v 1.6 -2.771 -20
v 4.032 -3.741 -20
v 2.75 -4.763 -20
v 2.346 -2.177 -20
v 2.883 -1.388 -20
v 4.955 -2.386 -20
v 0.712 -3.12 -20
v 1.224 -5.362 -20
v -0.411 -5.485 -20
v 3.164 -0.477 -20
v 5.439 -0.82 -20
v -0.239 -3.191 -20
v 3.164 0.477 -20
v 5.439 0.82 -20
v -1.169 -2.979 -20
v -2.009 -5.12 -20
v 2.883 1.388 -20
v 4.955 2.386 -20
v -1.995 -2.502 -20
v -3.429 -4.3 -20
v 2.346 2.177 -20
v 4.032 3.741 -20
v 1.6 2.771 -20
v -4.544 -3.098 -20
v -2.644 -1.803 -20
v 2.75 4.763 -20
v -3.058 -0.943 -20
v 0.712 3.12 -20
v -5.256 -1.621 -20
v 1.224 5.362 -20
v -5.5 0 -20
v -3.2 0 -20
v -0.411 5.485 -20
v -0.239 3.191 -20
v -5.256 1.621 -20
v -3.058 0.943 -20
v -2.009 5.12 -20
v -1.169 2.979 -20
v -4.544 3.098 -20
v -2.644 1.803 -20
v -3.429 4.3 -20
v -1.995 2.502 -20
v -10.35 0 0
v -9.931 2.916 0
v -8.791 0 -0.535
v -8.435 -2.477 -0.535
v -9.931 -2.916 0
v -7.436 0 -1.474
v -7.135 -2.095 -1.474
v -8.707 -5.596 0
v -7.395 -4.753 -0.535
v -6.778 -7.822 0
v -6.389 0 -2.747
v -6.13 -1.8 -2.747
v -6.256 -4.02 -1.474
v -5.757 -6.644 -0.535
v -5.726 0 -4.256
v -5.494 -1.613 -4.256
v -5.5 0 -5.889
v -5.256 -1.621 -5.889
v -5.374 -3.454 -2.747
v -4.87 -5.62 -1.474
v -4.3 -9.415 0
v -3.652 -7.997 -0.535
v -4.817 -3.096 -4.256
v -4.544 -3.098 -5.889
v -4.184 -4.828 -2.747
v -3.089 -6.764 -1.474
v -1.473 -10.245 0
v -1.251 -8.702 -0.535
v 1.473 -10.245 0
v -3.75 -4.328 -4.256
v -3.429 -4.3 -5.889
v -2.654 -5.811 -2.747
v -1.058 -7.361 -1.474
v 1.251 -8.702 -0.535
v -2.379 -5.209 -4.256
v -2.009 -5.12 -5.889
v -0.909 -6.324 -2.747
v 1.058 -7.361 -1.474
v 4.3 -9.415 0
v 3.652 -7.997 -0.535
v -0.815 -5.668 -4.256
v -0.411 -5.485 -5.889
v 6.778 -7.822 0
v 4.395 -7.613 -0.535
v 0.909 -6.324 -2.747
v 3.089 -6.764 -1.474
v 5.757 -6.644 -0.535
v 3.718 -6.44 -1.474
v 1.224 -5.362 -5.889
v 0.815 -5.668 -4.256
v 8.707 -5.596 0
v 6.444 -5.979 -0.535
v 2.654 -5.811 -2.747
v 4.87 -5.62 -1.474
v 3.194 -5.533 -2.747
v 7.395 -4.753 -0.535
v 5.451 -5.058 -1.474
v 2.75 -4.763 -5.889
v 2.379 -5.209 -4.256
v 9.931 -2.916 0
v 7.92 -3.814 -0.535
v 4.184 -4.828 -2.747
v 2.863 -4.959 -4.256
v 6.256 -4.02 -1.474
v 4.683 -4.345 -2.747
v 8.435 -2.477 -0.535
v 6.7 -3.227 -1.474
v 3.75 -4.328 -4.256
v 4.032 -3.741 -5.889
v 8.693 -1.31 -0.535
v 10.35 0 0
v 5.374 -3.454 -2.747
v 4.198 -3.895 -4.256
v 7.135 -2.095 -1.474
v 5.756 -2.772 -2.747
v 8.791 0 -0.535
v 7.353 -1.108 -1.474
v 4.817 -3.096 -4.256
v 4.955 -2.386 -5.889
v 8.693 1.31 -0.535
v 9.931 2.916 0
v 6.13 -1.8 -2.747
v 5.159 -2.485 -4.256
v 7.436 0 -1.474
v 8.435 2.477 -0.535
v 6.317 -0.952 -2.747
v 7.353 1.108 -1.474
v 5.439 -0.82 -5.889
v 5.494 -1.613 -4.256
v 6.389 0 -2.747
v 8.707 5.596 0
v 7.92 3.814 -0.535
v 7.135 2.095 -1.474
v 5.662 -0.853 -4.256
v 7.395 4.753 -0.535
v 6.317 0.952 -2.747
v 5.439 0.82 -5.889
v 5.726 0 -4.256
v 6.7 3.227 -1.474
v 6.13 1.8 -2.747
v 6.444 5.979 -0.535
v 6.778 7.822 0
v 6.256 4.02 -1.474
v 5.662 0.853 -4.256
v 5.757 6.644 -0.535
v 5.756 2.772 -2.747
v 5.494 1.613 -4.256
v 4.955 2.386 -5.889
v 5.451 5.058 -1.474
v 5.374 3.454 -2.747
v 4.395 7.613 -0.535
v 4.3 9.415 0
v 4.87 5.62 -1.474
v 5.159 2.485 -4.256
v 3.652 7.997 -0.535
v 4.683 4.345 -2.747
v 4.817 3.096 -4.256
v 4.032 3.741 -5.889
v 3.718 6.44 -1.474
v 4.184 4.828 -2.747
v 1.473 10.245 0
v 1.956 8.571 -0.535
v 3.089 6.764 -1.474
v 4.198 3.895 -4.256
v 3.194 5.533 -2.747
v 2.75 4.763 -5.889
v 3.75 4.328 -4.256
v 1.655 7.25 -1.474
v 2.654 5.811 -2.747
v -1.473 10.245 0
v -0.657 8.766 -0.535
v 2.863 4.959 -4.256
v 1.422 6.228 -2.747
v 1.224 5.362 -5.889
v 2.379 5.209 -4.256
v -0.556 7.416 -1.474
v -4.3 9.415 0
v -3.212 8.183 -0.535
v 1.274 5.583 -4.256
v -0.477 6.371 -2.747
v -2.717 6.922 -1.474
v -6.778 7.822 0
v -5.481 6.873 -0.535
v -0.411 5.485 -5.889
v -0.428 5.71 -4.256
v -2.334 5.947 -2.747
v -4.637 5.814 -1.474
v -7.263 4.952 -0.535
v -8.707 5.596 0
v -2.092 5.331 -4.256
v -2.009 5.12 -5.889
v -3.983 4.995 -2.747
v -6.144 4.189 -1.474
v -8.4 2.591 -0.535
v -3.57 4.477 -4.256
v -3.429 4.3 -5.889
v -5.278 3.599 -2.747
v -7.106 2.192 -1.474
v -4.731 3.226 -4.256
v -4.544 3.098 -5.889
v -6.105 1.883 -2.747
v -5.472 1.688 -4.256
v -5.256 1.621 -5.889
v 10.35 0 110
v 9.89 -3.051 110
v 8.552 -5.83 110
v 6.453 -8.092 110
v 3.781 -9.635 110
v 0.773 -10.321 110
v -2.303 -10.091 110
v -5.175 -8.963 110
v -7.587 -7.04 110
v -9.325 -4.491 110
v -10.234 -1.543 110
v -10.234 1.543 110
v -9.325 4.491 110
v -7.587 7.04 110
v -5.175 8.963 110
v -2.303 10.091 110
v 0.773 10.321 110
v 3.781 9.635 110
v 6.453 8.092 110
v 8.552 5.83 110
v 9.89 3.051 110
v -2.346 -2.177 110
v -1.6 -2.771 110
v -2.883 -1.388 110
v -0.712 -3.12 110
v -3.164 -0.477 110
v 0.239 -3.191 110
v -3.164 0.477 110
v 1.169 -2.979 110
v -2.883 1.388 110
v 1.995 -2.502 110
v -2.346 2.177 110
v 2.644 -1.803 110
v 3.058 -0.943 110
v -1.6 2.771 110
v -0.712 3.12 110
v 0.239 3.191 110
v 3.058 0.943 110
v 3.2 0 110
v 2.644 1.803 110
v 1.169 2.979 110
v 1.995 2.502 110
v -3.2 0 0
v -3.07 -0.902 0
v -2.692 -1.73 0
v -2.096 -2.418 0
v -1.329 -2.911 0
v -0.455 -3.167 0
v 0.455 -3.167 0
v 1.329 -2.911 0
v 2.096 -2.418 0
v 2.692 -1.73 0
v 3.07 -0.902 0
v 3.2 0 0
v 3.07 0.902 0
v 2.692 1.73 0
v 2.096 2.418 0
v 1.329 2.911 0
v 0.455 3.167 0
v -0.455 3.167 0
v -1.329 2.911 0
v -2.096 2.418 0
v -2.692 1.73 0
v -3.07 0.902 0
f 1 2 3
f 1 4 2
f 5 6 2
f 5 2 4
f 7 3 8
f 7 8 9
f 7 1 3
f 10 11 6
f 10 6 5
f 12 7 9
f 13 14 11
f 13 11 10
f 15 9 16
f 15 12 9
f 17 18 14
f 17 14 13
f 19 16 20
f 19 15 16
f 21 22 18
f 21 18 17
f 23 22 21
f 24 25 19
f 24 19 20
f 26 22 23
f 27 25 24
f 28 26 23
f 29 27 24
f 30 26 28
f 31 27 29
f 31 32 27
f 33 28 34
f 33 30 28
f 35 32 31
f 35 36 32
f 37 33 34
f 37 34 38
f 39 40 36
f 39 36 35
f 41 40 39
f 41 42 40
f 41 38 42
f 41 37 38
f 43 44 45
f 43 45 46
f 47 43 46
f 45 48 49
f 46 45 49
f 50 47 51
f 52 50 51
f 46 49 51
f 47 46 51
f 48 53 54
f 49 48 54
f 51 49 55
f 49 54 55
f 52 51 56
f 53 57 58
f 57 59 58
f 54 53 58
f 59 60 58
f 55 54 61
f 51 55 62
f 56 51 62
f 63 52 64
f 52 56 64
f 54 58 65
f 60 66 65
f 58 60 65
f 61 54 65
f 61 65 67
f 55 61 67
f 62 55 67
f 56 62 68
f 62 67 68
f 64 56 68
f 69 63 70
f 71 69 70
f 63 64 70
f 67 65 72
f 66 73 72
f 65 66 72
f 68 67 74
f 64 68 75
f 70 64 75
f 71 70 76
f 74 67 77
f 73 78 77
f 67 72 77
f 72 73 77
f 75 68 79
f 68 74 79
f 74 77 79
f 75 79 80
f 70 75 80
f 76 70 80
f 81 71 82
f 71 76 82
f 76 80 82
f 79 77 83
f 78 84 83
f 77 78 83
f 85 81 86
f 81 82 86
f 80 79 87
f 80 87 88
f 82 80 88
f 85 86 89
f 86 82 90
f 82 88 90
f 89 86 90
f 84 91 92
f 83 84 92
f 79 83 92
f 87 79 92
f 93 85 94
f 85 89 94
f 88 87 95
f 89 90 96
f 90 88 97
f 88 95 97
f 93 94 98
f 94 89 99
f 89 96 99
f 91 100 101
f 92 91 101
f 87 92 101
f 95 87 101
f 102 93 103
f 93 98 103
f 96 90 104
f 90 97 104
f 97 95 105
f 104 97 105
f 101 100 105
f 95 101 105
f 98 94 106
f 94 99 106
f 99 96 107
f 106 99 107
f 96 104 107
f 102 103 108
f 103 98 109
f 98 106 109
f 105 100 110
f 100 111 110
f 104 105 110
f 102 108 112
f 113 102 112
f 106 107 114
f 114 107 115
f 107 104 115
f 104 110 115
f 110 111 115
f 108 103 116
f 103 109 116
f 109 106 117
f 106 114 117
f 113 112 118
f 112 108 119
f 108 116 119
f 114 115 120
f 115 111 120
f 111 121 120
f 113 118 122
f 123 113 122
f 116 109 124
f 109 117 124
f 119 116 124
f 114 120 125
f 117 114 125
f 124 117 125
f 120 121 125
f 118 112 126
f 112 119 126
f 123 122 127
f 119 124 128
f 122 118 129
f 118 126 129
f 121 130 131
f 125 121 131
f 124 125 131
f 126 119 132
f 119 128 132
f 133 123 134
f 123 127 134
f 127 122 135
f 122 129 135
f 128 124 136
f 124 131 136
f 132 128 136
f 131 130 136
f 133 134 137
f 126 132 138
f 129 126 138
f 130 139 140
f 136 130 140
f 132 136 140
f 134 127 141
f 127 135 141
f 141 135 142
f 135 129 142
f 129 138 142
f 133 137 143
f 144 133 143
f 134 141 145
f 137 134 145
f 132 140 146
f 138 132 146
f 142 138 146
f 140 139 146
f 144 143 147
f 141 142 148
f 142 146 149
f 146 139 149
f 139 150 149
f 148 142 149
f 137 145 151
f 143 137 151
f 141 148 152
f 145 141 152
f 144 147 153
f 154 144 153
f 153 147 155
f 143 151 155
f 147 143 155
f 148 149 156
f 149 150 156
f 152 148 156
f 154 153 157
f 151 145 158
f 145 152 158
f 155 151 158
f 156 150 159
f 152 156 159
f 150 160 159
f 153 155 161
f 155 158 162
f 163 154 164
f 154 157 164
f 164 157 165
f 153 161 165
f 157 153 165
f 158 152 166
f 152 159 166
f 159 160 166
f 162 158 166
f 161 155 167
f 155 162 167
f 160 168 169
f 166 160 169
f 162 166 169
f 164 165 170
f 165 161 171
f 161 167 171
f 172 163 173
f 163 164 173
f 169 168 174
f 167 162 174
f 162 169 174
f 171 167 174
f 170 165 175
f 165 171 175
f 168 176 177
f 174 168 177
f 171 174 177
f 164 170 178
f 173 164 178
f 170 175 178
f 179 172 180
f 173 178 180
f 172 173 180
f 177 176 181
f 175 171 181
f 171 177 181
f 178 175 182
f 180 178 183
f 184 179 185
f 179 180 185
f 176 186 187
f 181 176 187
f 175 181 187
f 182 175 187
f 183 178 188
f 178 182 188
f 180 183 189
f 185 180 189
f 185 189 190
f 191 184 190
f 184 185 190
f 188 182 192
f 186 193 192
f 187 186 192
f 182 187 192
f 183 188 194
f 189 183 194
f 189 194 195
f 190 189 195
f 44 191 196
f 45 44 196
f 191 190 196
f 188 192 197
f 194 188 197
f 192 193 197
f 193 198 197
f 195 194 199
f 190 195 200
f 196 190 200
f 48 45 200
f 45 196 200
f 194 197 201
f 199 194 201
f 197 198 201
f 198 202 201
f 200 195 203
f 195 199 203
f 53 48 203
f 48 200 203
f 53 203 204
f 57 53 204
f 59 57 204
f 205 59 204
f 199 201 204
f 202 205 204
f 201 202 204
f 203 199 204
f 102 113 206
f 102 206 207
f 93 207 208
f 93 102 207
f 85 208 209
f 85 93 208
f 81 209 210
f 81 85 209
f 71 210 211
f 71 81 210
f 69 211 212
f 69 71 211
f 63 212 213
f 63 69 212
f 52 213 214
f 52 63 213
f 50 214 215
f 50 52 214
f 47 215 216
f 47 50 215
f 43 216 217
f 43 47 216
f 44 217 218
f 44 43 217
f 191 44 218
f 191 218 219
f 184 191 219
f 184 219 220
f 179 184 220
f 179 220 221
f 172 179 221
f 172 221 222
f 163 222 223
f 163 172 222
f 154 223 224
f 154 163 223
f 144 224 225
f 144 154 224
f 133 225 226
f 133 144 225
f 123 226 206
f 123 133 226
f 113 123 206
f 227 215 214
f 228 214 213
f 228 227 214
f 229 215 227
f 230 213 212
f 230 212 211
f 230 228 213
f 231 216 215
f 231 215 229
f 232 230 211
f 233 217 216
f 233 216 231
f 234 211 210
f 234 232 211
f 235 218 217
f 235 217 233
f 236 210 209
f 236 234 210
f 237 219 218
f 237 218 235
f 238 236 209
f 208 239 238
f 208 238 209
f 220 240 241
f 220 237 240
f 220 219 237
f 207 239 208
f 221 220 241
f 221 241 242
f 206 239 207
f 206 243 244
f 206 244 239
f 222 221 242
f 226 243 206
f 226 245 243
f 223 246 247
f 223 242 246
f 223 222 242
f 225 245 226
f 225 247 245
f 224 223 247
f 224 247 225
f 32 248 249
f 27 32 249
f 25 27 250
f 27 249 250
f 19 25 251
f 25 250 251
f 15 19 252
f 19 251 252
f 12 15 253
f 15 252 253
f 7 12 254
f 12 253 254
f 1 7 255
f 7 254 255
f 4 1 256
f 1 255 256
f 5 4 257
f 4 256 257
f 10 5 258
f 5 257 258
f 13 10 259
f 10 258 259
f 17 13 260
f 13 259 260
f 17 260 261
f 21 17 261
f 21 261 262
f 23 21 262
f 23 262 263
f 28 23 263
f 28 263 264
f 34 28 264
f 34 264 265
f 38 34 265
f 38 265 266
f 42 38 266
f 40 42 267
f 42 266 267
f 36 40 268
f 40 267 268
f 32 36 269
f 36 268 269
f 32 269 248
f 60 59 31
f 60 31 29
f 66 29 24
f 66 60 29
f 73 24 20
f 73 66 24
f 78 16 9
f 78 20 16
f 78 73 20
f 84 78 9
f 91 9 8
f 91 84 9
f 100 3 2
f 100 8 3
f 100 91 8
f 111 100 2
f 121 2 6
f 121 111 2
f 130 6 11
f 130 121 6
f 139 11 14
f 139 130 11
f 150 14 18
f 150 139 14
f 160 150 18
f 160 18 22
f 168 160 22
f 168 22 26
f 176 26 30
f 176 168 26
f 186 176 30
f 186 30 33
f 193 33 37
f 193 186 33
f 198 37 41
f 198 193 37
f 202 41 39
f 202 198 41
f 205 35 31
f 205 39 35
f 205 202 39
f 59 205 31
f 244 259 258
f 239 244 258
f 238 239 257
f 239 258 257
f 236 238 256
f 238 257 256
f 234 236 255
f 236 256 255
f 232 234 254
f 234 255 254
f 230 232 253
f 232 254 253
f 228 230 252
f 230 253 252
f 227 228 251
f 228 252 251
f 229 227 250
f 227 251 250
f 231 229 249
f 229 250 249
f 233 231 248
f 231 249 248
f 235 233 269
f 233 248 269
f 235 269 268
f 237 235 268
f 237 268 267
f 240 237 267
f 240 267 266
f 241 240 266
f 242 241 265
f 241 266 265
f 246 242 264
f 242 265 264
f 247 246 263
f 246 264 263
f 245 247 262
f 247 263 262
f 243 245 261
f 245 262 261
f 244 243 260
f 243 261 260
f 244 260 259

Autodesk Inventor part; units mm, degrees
ref_plane "YZ Plane" through (0, 0, 0) normal (1, 0, 0) x (0, 1, 0)
ref_plane "XZ Plane" through (0, 0, 0) normal (0, 1, 0) x (-1, 0, 0)
ref_plane "XY Plane" through (0, 0, 0) normal (0, 0, 1) x (1, 0, 0)
sketch "スケッチ1" plane through (0, 0, 0) normal (0, 0, 1) x (1, 0, 0)
  circle A0 centre (0, 0) radius 10.35
  circle A1 centre (0, 0) radius 3.2
  dimension "d0" = 20.7
  dimension "d1" = 6.4
extrude "押し出し1" add sketch "スケッチ1" along normal blind 110
sketch "スケッチ2" plane through (0, 0, 0) normal (0, 0, -1) x (-1, 0, 0)
  circle A0 centre (0, 0) radius 3.2 projected
  circle A1 centre (0, 0) radius 5.5
  dimension "d4" = 11
extrude "押し出し2" add sketch "スケッチ2" along normal blind 20
fillet "フィレット1" radius 6 1 edges at (5.5, 0, 0)
properties part number "gpu_supporter_01"
